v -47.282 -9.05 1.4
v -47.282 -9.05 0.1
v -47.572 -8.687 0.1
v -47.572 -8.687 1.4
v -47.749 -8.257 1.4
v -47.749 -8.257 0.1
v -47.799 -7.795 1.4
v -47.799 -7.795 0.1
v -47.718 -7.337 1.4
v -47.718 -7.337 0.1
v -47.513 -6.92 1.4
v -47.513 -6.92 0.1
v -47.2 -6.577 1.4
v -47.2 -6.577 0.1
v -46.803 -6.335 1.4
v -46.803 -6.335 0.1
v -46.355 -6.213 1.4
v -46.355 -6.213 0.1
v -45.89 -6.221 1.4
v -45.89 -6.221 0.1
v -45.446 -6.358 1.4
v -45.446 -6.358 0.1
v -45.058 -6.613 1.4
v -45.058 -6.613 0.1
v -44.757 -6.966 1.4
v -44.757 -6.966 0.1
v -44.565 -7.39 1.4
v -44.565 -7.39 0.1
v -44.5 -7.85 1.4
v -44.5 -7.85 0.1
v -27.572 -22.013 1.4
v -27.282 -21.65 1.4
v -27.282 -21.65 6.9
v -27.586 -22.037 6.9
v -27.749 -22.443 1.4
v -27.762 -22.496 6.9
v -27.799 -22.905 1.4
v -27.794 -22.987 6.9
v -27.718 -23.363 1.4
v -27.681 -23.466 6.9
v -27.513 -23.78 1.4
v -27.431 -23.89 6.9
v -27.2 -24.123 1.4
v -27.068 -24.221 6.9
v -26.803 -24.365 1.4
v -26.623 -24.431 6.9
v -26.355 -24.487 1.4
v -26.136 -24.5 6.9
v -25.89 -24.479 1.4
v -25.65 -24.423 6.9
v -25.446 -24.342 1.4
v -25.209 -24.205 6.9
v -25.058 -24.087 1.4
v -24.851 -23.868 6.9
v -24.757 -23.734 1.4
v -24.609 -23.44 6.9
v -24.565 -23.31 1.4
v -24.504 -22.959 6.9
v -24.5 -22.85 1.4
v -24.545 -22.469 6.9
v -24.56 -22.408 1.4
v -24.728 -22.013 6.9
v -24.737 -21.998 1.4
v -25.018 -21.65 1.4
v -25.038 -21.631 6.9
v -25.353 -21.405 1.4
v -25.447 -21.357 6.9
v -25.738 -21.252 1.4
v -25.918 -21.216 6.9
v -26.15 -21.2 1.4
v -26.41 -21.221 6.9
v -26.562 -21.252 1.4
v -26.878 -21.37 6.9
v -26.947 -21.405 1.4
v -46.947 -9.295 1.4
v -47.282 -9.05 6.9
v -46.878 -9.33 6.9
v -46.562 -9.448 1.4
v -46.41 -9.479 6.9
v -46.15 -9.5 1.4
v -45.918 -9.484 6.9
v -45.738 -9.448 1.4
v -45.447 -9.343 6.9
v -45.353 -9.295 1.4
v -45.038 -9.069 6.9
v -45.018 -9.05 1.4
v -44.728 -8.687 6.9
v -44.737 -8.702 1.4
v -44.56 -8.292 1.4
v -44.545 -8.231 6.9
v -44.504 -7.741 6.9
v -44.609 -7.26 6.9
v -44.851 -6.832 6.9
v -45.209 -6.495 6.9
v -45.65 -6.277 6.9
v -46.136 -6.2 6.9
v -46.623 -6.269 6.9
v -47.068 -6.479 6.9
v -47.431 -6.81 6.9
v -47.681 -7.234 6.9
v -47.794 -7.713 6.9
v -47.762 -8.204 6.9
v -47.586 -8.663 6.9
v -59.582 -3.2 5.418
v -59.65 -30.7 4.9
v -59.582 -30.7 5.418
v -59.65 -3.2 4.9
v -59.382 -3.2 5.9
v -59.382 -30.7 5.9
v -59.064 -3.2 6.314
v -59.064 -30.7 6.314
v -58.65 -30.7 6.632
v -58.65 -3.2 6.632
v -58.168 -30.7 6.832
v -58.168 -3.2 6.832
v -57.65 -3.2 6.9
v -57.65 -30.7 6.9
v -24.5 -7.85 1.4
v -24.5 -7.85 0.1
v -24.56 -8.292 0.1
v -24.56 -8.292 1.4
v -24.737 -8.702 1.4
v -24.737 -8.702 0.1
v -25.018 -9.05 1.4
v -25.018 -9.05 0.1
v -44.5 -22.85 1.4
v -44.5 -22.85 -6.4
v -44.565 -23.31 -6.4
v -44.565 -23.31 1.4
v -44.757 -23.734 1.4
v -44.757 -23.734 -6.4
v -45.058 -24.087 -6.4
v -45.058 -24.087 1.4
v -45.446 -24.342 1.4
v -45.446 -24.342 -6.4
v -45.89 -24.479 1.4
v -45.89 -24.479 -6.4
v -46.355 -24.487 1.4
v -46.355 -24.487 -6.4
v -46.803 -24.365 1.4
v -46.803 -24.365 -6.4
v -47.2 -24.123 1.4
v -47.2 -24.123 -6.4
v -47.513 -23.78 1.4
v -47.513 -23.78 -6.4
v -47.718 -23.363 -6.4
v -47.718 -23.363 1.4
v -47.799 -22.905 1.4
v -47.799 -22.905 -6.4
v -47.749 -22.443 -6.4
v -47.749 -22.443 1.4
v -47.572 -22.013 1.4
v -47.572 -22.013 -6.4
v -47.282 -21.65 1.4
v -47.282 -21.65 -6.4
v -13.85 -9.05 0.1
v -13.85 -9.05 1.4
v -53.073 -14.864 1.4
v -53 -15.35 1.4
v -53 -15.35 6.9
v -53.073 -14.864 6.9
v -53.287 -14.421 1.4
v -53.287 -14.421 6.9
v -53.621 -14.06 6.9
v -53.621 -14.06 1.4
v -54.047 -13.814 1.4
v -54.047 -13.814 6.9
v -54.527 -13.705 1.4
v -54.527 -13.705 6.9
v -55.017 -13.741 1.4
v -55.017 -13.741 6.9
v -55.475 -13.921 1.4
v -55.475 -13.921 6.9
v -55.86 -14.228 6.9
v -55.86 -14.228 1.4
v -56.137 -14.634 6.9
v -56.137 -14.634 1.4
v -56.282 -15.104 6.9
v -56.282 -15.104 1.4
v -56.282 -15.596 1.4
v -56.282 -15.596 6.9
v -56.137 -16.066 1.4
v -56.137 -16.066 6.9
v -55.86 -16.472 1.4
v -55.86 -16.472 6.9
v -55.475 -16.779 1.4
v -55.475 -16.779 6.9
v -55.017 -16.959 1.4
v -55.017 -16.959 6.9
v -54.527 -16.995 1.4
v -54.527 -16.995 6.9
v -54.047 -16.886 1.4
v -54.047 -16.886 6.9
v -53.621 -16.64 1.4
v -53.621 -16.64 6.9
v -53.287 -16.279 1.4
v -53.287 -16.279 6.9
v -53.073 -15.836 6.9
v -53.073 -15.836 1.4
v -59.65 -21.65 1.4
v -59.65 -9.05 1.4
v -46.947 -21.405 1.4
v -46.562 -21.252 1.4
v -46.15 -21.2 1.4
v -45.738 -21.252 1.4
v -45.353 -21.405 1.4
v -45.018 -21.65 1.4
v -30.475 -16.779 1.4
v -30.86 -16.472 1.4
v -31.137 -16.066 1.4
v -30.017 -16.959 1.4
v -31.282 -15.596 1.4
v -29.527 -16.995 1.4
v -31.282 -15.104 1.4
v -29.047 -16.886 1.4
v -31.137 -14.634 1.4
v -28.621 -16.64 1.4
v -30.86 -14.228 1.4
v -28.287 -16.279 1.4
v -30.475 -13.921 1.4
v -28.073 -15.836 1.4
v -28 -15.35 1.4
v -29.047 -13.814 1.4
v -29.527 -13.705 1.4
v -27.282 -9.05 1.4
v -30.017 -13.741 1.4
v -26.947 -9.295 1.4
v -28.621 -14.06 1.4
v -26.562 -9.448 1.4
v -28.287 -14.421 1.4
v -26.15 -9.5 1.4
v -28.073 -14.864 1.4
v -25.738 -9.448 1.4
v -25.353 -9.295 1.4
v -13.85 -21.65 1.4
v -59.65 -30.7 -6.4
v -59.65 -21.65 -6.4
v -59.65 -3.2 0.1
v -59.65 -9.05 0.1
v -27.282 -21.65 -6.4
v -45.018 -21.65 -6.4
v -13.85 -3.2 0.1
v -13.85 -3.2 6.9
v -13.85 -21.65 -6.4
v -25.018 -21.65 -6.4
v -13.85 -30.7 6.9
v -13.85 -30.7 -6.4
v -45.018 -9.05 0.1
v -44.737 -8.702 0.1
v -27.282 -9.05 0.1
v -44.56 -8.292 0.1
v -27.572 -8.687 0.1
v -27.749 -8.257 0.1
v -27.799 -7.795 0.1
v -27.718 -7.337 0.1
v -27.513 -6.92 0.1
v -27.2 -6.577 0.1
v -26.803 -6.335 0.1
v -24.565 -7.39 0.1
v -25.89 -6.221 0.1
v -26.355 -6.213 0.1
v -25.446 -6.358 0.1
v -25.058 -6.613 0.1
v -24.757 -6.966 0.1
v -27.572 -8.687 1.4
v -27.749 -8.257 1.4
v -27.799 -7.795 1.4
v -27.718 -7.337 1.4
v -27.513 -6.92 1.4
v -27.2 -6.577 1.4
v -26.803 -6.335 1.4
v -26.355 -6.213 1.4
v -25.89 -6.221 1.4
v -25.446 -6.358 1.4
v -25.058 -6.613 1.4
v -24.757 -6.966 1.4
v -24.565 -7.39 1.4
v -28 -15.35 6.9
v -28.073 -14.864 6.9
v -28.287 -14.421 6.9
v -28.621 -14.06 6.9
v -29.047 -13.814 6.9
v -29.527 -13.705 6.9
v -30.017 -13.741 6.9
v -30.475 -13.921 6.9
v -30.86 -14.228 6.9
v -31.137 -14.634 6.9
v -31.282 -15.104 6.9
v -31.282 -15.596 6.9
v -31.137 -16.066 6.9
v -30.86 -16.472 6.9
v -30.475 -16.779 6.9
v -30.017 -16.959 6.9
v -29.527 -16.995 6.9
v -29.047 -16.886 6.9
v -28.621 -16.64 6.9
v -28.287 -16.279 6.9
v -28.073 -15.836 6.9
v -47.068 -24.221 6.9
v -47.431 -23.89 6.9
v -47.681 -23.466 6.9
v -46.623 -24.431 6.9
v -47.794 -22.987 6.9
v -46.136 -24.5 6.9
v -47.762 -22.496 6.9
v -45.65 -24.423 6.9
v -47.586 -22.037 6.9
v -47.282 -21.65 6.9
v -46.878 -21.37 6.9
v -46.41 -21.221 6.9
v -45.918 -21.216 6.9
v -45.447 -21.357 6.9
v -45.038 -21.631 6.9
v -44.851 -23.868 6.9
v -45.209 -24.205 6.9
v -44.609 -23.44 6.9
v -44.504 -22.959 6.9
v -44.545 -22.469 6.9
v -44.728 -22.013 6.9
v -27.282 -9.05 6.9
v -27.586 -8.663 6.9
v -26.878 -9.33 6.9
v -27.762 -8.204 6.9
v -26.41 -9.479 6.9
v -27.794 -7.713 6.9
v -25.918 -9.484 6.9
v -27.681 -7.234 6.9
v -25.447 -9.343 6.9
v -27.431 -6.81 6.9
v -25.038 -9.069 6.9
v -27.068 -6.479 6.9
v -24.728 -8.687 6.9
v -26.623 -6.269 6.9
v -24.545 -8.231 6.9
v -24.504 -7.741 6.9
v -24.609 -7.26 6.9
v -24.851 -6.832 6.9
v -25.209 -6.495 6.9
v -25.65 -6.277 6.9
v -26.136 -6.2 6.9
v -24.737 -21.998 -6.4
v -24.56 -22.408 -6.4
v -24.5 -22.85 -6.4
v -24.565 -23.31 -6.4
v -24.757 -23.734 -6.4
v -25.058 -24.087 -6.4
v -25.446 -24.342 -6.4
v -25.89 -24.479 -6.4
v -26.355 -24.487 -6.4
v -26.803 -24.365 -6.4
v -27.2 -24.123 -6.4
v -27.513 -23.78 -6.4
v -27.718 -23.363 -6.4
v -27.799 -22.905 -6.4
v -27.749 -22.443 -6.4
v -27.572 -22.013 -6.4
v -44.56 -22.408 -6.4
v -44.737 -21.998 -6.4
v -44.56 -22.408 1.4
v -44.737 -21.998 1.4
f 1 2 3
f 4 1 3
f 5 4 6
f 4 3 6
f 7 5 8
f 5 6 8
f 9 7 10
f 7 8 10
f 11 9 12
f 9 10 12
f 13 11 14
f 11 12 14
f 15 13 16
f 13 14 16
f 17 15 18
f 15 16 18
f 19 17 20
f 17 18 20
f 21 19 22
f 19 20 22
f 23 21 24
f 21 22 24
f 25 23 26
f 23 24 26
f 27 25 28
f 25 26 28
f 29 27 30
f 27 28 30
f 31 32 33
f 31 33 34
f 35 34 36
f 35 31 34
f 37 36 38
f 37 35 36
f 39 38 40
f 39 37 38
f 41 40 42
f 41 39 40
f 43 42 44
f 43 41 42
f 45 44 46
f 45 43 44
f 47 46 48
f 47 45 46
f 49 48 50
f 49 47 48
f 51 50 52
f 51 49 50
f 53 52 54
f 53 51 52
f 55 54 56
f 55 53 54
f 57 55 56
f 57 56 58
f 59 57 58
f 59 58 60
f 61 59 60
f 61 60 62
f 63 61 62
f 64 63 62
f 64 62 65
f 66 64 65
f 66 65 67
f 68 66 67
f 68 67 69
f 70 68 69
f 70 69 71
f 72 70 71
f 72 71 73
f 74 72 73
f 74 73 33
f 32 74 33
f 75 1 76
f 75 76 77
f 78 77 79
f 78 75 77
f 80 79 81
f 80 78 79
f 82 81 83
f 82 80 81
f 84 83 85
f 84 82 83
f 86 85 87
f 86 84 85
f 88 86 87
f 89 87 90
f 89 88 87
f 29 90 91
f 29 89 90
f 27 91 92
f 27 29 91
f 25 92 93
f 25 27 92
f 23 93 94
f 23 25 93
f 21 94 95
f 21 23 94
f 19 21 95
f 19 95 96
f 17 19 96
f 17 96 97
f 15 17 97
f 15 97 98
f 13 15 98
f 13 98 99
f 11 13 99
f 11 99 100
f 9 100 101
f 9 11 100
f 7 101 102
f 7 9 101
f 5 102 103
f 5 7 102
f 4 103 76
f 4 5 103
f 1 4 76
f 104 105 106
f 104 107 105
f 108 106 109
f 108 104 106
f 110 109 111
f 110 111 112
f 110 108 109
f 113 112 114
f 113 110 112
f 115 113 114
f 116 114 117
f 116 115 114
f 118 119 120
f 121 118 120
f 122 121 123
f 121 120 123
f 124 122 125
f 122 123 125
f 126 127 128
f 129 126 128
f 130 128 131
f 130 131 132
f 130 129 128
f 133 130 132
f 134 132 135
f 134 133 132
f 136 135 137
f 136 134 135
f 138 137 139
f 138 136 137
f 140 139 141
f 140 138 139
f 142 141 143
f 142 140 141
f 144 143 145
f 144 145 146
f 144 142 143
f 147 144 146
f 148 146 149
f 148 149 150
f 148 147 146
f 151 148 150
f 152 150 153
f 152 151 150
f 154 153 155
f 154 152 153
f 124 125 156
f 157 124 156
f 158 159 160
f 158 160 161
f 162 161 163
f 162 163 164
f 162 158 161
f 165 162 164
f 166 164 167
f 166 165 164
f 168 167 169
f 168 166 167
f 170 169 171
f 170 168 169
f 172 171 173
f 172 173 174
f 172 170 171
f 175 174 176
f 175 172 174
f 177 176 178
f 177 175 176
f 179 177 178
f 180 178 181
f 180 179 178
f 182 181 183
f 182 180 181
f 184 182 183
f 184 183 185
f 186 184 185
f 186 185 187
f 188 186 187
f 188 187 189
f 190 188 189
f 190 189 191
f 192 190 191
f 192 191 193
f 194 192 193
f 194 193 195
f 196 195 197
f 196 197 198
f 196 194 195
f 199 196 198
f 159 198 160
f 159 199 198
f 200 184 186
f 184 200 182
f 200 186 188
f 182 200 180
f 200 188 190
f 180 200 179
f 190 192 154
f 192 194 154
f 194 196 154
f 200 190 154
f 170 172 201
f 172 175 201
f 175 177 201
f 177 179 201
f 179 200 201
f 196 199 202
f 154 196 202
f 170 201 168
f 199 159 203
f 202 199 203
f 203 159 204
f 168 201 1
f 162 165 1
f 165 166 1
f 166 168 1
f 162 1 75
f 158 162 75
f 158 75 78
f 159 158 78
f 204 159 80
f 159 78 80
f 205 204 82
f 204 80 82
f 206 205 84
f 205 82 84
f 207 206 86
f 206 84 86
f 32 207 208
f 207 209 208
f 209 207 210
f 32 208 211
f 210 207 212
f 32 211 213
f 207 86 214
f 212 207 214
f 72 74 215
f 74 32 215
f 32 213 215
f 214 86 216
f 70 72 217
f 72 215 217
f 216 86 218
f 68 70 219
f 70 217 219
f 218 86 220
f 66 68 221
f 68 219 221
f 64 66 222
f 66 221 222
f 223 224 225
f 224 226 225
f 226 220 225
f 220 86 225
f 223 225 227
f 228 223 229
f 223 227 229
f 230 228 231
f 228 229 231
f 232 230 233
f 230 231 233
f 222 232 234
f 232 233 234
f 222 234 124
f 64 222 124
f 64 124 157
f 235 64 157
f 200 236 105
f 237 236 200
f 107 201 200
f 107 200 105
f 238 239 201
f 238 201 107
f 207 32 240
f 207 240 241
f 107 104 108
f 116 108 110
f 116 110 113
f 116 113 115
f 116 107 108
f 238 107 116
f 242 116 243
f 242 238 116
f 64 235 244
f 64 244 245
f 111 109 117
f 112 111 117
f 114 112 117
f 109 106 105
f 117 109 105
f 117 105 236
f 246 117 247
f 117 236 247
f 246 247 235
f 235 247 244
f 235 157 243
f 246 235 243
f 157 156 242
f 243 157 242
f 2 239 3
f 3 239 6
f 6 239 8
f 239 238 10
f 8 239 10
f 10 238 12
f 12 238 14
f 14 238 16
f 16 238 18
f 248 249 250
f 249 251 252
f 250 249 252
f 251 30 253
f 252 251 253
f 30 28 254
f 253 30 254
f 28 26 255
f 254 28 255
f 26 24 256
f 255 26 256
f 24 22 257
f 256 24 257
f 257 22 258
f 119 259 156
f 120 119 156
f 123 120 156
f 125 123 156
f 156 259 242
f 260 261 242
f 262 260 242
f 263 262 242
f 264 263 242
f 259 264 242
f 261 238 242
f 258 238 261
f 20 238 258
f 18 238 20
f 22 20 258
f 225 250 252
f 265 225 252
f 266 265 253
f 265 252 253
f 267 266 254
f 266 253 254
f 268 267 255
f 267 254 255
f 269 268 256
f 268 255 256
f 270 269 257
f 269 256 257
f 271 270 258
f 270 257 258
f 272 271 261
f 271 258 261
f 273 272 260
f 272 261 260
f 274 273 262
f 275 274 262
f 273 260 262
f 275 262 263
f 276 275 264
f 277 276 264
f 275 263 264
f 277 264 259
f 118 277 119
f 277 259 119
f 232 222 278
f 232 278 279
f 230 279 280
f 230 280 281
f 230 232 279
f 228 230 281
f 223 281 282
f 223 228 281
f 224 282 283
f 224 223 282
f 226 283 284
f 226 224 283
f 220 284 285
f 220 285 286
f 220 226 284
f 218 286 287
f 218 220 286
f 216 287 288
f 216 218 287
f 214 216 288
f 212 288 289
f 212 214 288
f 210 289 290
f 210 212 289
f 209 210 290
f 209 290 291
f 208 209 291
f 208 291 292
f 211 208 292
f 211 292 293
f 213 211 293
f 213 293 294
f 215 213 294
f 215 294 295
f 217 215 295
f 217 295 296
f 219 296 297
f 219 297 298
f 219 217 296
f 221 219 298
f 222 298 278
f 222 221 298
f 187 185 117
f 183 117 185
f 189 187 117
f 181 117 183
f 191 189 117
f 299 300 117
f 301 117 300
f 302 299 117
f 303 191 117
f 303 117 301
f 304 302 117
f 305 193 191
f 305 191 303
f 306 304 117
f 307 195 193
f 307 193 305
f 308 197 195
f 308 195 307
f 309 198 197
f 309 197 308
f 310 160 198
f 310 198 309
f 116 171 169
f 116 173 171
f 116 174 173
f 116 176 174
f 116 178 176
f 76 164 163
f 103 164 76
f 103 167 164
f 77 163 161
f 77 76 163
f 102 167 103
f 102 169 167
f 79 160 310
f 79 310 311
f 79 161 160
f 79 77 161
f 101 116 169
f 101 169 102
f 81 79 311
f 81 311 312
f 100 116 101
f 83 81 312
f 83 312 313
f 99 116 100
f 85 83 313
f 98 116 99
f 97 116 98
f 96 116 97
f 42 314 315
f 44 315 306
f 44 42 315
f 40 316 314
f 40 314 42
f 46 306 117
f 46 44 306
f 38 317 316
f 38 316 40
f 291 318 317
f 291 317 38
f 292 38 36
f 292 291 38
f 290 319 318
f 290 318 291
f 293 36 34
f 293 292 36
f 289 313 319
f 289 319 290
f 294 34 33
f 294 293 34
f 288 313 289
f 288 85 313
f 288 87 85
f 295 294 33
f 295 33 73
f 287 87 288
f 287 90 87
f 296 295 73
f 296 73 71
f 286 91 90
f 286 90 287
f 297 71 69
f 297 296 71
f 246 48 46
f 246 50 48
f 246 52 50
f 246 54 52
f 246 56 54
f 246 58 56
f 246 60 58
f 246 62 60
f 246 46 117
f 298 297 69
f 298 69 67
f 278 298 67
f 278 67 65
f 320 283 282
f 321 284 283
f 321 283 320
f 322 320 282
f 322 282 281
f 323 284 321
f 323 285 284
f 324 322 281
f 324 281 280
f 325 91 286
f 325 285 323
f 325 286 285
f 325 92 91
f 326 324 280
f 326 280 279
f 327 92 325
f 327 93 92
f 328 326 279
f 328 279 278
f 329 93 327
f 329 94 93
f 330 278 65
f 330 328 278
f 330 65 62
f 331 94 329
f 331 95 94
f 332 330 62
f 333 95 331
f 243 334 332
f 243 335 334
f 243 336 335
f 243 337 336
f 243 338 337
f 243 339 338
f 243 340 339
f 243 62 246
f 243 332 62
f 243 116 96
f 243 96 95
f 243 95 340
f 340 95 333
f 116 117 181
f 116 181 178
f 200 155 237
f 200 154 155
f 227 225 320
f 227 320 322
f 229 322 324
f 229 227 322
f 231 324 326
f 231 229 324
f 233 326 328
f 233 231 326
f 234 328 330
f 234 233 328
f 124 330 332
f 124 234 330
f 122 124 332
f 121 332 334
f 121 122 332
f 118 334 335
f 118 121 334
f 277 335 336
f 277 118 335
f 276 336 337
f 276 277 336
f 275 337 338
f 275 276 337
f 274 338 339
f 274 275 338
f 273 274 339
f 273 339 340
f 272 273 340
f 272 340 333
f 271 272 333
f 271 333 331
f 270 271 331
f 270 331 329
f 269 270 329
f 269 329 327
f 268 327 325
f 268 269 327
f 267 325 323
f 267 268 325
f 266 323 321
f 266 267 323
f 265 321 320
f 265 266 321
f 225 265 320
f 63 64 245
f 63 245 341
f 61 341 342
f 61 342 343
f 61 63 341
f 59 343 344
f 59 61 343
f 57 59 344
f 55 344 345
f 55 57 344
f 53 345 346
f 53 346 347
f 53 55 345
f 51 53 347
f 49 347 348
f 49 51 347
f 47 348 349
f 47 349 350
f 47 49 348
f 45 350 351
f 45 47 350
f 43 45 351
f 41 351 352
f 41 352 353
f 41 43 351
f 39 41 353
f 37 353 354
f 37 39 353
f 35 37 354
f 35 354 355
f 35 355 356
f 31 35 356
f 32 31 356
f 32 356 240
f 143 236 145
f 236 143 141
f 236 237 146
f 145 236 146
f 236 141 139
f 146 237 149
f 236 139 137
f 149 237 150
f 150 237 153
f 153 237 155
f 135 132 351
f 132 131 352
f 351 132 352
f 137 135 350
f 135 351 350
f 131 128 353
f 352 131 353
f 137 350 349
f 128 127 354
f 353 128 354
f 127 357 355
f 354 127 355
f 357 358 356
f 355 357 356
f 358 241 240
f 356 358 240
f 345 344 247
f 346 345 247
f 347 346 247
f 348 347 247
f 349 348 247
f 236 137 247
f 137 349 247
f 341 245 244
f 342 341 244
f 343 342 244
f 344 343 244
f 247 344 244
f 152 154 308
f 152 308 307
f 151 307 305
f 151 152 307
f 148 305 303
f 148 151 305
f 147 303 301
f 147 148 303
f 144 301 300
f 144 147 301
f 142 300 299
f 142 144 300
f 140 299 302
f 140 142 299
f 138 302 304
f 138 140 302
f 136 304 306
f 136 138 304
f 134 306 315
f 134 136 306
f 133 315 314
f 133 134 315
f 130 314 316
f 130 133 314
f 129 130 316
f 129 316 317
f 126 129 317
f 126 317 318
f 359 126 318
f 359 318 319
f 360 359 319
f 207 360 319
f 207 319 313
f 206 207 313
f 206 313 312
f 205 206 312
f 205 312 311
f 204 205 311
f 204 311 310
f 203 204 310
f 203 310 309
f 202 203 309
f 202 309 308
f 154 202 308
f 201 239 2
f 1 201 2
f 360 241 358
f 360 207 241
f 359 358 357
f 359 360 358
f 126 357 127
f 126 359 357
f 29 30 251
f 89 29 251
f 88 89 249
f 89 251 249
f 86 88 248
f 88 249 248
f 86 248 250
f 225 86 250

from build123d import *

# Parameters (mm, degrees)
SALIENTE_EXTRUIR1_START      = 0.1
SALIENTE_EXTRUIR1_DEPTH      = 1.3
SALIENTE_EXTRUIR3_START      = 0.1
SALIENTE_EXTRUIR3_DEPTH      = 1.3
SALIENTE_EXTRUIR3_DEPTH_BACK = 6.5
SALIENTE_EXTRUIR2_START      = 1.4
CROQUIS1_3_W                 = 45.8
CROQUIS1_3_H                 = 27.5
CROQUIS1_3_R                 = 1.65
SALIENTE_EXTRUIR2_DEPTH      = 5.5
REDONDEO2_R                  = 2


with BuildPart() as part:
    # Croquis1 → Saliente-Extruir1 (new body)
    with BuildSketch(Plane.XY.offset(SALIENTE_EXTRUIR1_START)):
        with BuildLine():
            Line((-13.85, -3.2), (-59.65, -3.2))
            Line((-59.65, -3.2), (-59.65, -9.05))
            Line((-59.65, -9.05), (-47.282475165, -9.05))
            ThreePointArc((-47.282475165, -9.05), (-46.803420224, -6.334895379), (-44.5, -7.85))
            ThreePointArc((-44.5, -7.85), (-44.634895379, -8.503420224), (-45.017524835, -9.05))
            Line((-45.017524835, -9.05), (-27.282475165, -9.05))
            ThreePointArc((-27.282475165, -9.05), (-26.803420224, -6.334895379), (-24.5, -7.85))
            ThreePointArc((-24.5, -7.85), (-24.634895379, -8.503420224), (-25.017524835, -9.05))
            Line((-25.017524835, -9.05), (-13.85, -9.05))
            Line((-13.85, -9.05), (-13.85, -3.2))
        make_face()
    extrude(amount=SALIENTE_EXTRUIR1_DEPTH)



with BuildPart() as body_2:
    # Croquis1<5> → Saliente-Extruir3 (new, two sides)
    with BuildSketch(Plane.XY.offset(SALIENTE_EXTRUIR3_START)) as saliente_extruir3_sk:
        with BuildLine():
            Line((-47.282489505, -21.65), (-59.65, -21.65))
            Line((-59.65, -21.65), (-59.65, -30.7))
            Line((-59.65, -30.7), (-13.85, -30.7))
            Line((-13.85, -30.7), (-13.85, -21.65))
            Line((-13.85, -21.65), (-25.017510495, -21.65))
            ThreePointArc((-25.017510495, -21.65), (-24.634891475, -22.196575296), (-24.5, -22.849986467))
            ThreePointArc((-24.5, -22.849986467), (-26.803411171, -24.365094992), (-27.282489505, -21.65))
            Line((-27.282489505, -21.65), (-45.017510495, -21.65))
            ThreePointArc((-45.017510495, -21.65), (-44.634891475, -22.196575296), (-44.5, -22.849986467))
            ThreePointArc((-44.5, -22.849986467), (-46.803411171, -24.365094992), (-47.282489505, -21.65))
        make_face()
    extrude(amount=SALIENTE_EXTRUIR3_DEPTH)
    extrude(saliente_extruir3_sk.sketch, amount=-SALIENTE_EXTRUIR3_DEPTH_BACK)


with BuildPart() as part_1:
    add(part.part)

    add(body_2.part)  # Saliente-Extruir2 merges body 2
    # Croquis1<3> → Saliente-Extruir2 (add)
    with BuildSketch(Plane.XY.offset(SALIENTE_EXTRUIR2_START)):
        with Locations((-36.75, -16.95)):
            Rectangle(CROQUIS1_3_W, CROQUIS1_3_H)
        with Locations(Location((-46.15, -22.849986467, 0), (0, 0, 133.342442907))):
            Circle(CROQUIS1_3_R, mode=Mode.SUBTRACT)
        with Locations(Location((-26.15, -22.849986467, 0), (0, 0, 133.342442907))):
            Circle(CROQUIS1_3_R, mode=Mode.SUBTRACT)
        with Locations(Location((-26.15, -7.85, 0), (0, 0, 226.658241773))):
            Circle(CROQUIS1_3_R, mode=Mode.SUBTRACT)
        with Locations(Location((-46.15, -7.85, 0), (0, 0, 226.658241773))):
            Circle(CROQUIS1_3_R, mode=Mode.SUBTRACT)
        with Locations((-54.65, -15.35)):
            Circle(CROQUIS1_3_R, mode=Mode.SUBTRACT)
        with Locations((-29.65, -15.35)):
            Circle(CROQUIS1_3_R, mode=Mode.SUBTRACT)
    extrude(amount=SALIENTE_EXTRUIR2_DEPTH)

    # Redondeo2
    redondeo2_edges = [part_1.edges().sort_by_distance(p)[0] for p in [
        (-59.65, -16.95, 6.9),
    ]]
    fillet(redondeo2_edges, radius=REDONDEO2_R)


solid = part_1.part
